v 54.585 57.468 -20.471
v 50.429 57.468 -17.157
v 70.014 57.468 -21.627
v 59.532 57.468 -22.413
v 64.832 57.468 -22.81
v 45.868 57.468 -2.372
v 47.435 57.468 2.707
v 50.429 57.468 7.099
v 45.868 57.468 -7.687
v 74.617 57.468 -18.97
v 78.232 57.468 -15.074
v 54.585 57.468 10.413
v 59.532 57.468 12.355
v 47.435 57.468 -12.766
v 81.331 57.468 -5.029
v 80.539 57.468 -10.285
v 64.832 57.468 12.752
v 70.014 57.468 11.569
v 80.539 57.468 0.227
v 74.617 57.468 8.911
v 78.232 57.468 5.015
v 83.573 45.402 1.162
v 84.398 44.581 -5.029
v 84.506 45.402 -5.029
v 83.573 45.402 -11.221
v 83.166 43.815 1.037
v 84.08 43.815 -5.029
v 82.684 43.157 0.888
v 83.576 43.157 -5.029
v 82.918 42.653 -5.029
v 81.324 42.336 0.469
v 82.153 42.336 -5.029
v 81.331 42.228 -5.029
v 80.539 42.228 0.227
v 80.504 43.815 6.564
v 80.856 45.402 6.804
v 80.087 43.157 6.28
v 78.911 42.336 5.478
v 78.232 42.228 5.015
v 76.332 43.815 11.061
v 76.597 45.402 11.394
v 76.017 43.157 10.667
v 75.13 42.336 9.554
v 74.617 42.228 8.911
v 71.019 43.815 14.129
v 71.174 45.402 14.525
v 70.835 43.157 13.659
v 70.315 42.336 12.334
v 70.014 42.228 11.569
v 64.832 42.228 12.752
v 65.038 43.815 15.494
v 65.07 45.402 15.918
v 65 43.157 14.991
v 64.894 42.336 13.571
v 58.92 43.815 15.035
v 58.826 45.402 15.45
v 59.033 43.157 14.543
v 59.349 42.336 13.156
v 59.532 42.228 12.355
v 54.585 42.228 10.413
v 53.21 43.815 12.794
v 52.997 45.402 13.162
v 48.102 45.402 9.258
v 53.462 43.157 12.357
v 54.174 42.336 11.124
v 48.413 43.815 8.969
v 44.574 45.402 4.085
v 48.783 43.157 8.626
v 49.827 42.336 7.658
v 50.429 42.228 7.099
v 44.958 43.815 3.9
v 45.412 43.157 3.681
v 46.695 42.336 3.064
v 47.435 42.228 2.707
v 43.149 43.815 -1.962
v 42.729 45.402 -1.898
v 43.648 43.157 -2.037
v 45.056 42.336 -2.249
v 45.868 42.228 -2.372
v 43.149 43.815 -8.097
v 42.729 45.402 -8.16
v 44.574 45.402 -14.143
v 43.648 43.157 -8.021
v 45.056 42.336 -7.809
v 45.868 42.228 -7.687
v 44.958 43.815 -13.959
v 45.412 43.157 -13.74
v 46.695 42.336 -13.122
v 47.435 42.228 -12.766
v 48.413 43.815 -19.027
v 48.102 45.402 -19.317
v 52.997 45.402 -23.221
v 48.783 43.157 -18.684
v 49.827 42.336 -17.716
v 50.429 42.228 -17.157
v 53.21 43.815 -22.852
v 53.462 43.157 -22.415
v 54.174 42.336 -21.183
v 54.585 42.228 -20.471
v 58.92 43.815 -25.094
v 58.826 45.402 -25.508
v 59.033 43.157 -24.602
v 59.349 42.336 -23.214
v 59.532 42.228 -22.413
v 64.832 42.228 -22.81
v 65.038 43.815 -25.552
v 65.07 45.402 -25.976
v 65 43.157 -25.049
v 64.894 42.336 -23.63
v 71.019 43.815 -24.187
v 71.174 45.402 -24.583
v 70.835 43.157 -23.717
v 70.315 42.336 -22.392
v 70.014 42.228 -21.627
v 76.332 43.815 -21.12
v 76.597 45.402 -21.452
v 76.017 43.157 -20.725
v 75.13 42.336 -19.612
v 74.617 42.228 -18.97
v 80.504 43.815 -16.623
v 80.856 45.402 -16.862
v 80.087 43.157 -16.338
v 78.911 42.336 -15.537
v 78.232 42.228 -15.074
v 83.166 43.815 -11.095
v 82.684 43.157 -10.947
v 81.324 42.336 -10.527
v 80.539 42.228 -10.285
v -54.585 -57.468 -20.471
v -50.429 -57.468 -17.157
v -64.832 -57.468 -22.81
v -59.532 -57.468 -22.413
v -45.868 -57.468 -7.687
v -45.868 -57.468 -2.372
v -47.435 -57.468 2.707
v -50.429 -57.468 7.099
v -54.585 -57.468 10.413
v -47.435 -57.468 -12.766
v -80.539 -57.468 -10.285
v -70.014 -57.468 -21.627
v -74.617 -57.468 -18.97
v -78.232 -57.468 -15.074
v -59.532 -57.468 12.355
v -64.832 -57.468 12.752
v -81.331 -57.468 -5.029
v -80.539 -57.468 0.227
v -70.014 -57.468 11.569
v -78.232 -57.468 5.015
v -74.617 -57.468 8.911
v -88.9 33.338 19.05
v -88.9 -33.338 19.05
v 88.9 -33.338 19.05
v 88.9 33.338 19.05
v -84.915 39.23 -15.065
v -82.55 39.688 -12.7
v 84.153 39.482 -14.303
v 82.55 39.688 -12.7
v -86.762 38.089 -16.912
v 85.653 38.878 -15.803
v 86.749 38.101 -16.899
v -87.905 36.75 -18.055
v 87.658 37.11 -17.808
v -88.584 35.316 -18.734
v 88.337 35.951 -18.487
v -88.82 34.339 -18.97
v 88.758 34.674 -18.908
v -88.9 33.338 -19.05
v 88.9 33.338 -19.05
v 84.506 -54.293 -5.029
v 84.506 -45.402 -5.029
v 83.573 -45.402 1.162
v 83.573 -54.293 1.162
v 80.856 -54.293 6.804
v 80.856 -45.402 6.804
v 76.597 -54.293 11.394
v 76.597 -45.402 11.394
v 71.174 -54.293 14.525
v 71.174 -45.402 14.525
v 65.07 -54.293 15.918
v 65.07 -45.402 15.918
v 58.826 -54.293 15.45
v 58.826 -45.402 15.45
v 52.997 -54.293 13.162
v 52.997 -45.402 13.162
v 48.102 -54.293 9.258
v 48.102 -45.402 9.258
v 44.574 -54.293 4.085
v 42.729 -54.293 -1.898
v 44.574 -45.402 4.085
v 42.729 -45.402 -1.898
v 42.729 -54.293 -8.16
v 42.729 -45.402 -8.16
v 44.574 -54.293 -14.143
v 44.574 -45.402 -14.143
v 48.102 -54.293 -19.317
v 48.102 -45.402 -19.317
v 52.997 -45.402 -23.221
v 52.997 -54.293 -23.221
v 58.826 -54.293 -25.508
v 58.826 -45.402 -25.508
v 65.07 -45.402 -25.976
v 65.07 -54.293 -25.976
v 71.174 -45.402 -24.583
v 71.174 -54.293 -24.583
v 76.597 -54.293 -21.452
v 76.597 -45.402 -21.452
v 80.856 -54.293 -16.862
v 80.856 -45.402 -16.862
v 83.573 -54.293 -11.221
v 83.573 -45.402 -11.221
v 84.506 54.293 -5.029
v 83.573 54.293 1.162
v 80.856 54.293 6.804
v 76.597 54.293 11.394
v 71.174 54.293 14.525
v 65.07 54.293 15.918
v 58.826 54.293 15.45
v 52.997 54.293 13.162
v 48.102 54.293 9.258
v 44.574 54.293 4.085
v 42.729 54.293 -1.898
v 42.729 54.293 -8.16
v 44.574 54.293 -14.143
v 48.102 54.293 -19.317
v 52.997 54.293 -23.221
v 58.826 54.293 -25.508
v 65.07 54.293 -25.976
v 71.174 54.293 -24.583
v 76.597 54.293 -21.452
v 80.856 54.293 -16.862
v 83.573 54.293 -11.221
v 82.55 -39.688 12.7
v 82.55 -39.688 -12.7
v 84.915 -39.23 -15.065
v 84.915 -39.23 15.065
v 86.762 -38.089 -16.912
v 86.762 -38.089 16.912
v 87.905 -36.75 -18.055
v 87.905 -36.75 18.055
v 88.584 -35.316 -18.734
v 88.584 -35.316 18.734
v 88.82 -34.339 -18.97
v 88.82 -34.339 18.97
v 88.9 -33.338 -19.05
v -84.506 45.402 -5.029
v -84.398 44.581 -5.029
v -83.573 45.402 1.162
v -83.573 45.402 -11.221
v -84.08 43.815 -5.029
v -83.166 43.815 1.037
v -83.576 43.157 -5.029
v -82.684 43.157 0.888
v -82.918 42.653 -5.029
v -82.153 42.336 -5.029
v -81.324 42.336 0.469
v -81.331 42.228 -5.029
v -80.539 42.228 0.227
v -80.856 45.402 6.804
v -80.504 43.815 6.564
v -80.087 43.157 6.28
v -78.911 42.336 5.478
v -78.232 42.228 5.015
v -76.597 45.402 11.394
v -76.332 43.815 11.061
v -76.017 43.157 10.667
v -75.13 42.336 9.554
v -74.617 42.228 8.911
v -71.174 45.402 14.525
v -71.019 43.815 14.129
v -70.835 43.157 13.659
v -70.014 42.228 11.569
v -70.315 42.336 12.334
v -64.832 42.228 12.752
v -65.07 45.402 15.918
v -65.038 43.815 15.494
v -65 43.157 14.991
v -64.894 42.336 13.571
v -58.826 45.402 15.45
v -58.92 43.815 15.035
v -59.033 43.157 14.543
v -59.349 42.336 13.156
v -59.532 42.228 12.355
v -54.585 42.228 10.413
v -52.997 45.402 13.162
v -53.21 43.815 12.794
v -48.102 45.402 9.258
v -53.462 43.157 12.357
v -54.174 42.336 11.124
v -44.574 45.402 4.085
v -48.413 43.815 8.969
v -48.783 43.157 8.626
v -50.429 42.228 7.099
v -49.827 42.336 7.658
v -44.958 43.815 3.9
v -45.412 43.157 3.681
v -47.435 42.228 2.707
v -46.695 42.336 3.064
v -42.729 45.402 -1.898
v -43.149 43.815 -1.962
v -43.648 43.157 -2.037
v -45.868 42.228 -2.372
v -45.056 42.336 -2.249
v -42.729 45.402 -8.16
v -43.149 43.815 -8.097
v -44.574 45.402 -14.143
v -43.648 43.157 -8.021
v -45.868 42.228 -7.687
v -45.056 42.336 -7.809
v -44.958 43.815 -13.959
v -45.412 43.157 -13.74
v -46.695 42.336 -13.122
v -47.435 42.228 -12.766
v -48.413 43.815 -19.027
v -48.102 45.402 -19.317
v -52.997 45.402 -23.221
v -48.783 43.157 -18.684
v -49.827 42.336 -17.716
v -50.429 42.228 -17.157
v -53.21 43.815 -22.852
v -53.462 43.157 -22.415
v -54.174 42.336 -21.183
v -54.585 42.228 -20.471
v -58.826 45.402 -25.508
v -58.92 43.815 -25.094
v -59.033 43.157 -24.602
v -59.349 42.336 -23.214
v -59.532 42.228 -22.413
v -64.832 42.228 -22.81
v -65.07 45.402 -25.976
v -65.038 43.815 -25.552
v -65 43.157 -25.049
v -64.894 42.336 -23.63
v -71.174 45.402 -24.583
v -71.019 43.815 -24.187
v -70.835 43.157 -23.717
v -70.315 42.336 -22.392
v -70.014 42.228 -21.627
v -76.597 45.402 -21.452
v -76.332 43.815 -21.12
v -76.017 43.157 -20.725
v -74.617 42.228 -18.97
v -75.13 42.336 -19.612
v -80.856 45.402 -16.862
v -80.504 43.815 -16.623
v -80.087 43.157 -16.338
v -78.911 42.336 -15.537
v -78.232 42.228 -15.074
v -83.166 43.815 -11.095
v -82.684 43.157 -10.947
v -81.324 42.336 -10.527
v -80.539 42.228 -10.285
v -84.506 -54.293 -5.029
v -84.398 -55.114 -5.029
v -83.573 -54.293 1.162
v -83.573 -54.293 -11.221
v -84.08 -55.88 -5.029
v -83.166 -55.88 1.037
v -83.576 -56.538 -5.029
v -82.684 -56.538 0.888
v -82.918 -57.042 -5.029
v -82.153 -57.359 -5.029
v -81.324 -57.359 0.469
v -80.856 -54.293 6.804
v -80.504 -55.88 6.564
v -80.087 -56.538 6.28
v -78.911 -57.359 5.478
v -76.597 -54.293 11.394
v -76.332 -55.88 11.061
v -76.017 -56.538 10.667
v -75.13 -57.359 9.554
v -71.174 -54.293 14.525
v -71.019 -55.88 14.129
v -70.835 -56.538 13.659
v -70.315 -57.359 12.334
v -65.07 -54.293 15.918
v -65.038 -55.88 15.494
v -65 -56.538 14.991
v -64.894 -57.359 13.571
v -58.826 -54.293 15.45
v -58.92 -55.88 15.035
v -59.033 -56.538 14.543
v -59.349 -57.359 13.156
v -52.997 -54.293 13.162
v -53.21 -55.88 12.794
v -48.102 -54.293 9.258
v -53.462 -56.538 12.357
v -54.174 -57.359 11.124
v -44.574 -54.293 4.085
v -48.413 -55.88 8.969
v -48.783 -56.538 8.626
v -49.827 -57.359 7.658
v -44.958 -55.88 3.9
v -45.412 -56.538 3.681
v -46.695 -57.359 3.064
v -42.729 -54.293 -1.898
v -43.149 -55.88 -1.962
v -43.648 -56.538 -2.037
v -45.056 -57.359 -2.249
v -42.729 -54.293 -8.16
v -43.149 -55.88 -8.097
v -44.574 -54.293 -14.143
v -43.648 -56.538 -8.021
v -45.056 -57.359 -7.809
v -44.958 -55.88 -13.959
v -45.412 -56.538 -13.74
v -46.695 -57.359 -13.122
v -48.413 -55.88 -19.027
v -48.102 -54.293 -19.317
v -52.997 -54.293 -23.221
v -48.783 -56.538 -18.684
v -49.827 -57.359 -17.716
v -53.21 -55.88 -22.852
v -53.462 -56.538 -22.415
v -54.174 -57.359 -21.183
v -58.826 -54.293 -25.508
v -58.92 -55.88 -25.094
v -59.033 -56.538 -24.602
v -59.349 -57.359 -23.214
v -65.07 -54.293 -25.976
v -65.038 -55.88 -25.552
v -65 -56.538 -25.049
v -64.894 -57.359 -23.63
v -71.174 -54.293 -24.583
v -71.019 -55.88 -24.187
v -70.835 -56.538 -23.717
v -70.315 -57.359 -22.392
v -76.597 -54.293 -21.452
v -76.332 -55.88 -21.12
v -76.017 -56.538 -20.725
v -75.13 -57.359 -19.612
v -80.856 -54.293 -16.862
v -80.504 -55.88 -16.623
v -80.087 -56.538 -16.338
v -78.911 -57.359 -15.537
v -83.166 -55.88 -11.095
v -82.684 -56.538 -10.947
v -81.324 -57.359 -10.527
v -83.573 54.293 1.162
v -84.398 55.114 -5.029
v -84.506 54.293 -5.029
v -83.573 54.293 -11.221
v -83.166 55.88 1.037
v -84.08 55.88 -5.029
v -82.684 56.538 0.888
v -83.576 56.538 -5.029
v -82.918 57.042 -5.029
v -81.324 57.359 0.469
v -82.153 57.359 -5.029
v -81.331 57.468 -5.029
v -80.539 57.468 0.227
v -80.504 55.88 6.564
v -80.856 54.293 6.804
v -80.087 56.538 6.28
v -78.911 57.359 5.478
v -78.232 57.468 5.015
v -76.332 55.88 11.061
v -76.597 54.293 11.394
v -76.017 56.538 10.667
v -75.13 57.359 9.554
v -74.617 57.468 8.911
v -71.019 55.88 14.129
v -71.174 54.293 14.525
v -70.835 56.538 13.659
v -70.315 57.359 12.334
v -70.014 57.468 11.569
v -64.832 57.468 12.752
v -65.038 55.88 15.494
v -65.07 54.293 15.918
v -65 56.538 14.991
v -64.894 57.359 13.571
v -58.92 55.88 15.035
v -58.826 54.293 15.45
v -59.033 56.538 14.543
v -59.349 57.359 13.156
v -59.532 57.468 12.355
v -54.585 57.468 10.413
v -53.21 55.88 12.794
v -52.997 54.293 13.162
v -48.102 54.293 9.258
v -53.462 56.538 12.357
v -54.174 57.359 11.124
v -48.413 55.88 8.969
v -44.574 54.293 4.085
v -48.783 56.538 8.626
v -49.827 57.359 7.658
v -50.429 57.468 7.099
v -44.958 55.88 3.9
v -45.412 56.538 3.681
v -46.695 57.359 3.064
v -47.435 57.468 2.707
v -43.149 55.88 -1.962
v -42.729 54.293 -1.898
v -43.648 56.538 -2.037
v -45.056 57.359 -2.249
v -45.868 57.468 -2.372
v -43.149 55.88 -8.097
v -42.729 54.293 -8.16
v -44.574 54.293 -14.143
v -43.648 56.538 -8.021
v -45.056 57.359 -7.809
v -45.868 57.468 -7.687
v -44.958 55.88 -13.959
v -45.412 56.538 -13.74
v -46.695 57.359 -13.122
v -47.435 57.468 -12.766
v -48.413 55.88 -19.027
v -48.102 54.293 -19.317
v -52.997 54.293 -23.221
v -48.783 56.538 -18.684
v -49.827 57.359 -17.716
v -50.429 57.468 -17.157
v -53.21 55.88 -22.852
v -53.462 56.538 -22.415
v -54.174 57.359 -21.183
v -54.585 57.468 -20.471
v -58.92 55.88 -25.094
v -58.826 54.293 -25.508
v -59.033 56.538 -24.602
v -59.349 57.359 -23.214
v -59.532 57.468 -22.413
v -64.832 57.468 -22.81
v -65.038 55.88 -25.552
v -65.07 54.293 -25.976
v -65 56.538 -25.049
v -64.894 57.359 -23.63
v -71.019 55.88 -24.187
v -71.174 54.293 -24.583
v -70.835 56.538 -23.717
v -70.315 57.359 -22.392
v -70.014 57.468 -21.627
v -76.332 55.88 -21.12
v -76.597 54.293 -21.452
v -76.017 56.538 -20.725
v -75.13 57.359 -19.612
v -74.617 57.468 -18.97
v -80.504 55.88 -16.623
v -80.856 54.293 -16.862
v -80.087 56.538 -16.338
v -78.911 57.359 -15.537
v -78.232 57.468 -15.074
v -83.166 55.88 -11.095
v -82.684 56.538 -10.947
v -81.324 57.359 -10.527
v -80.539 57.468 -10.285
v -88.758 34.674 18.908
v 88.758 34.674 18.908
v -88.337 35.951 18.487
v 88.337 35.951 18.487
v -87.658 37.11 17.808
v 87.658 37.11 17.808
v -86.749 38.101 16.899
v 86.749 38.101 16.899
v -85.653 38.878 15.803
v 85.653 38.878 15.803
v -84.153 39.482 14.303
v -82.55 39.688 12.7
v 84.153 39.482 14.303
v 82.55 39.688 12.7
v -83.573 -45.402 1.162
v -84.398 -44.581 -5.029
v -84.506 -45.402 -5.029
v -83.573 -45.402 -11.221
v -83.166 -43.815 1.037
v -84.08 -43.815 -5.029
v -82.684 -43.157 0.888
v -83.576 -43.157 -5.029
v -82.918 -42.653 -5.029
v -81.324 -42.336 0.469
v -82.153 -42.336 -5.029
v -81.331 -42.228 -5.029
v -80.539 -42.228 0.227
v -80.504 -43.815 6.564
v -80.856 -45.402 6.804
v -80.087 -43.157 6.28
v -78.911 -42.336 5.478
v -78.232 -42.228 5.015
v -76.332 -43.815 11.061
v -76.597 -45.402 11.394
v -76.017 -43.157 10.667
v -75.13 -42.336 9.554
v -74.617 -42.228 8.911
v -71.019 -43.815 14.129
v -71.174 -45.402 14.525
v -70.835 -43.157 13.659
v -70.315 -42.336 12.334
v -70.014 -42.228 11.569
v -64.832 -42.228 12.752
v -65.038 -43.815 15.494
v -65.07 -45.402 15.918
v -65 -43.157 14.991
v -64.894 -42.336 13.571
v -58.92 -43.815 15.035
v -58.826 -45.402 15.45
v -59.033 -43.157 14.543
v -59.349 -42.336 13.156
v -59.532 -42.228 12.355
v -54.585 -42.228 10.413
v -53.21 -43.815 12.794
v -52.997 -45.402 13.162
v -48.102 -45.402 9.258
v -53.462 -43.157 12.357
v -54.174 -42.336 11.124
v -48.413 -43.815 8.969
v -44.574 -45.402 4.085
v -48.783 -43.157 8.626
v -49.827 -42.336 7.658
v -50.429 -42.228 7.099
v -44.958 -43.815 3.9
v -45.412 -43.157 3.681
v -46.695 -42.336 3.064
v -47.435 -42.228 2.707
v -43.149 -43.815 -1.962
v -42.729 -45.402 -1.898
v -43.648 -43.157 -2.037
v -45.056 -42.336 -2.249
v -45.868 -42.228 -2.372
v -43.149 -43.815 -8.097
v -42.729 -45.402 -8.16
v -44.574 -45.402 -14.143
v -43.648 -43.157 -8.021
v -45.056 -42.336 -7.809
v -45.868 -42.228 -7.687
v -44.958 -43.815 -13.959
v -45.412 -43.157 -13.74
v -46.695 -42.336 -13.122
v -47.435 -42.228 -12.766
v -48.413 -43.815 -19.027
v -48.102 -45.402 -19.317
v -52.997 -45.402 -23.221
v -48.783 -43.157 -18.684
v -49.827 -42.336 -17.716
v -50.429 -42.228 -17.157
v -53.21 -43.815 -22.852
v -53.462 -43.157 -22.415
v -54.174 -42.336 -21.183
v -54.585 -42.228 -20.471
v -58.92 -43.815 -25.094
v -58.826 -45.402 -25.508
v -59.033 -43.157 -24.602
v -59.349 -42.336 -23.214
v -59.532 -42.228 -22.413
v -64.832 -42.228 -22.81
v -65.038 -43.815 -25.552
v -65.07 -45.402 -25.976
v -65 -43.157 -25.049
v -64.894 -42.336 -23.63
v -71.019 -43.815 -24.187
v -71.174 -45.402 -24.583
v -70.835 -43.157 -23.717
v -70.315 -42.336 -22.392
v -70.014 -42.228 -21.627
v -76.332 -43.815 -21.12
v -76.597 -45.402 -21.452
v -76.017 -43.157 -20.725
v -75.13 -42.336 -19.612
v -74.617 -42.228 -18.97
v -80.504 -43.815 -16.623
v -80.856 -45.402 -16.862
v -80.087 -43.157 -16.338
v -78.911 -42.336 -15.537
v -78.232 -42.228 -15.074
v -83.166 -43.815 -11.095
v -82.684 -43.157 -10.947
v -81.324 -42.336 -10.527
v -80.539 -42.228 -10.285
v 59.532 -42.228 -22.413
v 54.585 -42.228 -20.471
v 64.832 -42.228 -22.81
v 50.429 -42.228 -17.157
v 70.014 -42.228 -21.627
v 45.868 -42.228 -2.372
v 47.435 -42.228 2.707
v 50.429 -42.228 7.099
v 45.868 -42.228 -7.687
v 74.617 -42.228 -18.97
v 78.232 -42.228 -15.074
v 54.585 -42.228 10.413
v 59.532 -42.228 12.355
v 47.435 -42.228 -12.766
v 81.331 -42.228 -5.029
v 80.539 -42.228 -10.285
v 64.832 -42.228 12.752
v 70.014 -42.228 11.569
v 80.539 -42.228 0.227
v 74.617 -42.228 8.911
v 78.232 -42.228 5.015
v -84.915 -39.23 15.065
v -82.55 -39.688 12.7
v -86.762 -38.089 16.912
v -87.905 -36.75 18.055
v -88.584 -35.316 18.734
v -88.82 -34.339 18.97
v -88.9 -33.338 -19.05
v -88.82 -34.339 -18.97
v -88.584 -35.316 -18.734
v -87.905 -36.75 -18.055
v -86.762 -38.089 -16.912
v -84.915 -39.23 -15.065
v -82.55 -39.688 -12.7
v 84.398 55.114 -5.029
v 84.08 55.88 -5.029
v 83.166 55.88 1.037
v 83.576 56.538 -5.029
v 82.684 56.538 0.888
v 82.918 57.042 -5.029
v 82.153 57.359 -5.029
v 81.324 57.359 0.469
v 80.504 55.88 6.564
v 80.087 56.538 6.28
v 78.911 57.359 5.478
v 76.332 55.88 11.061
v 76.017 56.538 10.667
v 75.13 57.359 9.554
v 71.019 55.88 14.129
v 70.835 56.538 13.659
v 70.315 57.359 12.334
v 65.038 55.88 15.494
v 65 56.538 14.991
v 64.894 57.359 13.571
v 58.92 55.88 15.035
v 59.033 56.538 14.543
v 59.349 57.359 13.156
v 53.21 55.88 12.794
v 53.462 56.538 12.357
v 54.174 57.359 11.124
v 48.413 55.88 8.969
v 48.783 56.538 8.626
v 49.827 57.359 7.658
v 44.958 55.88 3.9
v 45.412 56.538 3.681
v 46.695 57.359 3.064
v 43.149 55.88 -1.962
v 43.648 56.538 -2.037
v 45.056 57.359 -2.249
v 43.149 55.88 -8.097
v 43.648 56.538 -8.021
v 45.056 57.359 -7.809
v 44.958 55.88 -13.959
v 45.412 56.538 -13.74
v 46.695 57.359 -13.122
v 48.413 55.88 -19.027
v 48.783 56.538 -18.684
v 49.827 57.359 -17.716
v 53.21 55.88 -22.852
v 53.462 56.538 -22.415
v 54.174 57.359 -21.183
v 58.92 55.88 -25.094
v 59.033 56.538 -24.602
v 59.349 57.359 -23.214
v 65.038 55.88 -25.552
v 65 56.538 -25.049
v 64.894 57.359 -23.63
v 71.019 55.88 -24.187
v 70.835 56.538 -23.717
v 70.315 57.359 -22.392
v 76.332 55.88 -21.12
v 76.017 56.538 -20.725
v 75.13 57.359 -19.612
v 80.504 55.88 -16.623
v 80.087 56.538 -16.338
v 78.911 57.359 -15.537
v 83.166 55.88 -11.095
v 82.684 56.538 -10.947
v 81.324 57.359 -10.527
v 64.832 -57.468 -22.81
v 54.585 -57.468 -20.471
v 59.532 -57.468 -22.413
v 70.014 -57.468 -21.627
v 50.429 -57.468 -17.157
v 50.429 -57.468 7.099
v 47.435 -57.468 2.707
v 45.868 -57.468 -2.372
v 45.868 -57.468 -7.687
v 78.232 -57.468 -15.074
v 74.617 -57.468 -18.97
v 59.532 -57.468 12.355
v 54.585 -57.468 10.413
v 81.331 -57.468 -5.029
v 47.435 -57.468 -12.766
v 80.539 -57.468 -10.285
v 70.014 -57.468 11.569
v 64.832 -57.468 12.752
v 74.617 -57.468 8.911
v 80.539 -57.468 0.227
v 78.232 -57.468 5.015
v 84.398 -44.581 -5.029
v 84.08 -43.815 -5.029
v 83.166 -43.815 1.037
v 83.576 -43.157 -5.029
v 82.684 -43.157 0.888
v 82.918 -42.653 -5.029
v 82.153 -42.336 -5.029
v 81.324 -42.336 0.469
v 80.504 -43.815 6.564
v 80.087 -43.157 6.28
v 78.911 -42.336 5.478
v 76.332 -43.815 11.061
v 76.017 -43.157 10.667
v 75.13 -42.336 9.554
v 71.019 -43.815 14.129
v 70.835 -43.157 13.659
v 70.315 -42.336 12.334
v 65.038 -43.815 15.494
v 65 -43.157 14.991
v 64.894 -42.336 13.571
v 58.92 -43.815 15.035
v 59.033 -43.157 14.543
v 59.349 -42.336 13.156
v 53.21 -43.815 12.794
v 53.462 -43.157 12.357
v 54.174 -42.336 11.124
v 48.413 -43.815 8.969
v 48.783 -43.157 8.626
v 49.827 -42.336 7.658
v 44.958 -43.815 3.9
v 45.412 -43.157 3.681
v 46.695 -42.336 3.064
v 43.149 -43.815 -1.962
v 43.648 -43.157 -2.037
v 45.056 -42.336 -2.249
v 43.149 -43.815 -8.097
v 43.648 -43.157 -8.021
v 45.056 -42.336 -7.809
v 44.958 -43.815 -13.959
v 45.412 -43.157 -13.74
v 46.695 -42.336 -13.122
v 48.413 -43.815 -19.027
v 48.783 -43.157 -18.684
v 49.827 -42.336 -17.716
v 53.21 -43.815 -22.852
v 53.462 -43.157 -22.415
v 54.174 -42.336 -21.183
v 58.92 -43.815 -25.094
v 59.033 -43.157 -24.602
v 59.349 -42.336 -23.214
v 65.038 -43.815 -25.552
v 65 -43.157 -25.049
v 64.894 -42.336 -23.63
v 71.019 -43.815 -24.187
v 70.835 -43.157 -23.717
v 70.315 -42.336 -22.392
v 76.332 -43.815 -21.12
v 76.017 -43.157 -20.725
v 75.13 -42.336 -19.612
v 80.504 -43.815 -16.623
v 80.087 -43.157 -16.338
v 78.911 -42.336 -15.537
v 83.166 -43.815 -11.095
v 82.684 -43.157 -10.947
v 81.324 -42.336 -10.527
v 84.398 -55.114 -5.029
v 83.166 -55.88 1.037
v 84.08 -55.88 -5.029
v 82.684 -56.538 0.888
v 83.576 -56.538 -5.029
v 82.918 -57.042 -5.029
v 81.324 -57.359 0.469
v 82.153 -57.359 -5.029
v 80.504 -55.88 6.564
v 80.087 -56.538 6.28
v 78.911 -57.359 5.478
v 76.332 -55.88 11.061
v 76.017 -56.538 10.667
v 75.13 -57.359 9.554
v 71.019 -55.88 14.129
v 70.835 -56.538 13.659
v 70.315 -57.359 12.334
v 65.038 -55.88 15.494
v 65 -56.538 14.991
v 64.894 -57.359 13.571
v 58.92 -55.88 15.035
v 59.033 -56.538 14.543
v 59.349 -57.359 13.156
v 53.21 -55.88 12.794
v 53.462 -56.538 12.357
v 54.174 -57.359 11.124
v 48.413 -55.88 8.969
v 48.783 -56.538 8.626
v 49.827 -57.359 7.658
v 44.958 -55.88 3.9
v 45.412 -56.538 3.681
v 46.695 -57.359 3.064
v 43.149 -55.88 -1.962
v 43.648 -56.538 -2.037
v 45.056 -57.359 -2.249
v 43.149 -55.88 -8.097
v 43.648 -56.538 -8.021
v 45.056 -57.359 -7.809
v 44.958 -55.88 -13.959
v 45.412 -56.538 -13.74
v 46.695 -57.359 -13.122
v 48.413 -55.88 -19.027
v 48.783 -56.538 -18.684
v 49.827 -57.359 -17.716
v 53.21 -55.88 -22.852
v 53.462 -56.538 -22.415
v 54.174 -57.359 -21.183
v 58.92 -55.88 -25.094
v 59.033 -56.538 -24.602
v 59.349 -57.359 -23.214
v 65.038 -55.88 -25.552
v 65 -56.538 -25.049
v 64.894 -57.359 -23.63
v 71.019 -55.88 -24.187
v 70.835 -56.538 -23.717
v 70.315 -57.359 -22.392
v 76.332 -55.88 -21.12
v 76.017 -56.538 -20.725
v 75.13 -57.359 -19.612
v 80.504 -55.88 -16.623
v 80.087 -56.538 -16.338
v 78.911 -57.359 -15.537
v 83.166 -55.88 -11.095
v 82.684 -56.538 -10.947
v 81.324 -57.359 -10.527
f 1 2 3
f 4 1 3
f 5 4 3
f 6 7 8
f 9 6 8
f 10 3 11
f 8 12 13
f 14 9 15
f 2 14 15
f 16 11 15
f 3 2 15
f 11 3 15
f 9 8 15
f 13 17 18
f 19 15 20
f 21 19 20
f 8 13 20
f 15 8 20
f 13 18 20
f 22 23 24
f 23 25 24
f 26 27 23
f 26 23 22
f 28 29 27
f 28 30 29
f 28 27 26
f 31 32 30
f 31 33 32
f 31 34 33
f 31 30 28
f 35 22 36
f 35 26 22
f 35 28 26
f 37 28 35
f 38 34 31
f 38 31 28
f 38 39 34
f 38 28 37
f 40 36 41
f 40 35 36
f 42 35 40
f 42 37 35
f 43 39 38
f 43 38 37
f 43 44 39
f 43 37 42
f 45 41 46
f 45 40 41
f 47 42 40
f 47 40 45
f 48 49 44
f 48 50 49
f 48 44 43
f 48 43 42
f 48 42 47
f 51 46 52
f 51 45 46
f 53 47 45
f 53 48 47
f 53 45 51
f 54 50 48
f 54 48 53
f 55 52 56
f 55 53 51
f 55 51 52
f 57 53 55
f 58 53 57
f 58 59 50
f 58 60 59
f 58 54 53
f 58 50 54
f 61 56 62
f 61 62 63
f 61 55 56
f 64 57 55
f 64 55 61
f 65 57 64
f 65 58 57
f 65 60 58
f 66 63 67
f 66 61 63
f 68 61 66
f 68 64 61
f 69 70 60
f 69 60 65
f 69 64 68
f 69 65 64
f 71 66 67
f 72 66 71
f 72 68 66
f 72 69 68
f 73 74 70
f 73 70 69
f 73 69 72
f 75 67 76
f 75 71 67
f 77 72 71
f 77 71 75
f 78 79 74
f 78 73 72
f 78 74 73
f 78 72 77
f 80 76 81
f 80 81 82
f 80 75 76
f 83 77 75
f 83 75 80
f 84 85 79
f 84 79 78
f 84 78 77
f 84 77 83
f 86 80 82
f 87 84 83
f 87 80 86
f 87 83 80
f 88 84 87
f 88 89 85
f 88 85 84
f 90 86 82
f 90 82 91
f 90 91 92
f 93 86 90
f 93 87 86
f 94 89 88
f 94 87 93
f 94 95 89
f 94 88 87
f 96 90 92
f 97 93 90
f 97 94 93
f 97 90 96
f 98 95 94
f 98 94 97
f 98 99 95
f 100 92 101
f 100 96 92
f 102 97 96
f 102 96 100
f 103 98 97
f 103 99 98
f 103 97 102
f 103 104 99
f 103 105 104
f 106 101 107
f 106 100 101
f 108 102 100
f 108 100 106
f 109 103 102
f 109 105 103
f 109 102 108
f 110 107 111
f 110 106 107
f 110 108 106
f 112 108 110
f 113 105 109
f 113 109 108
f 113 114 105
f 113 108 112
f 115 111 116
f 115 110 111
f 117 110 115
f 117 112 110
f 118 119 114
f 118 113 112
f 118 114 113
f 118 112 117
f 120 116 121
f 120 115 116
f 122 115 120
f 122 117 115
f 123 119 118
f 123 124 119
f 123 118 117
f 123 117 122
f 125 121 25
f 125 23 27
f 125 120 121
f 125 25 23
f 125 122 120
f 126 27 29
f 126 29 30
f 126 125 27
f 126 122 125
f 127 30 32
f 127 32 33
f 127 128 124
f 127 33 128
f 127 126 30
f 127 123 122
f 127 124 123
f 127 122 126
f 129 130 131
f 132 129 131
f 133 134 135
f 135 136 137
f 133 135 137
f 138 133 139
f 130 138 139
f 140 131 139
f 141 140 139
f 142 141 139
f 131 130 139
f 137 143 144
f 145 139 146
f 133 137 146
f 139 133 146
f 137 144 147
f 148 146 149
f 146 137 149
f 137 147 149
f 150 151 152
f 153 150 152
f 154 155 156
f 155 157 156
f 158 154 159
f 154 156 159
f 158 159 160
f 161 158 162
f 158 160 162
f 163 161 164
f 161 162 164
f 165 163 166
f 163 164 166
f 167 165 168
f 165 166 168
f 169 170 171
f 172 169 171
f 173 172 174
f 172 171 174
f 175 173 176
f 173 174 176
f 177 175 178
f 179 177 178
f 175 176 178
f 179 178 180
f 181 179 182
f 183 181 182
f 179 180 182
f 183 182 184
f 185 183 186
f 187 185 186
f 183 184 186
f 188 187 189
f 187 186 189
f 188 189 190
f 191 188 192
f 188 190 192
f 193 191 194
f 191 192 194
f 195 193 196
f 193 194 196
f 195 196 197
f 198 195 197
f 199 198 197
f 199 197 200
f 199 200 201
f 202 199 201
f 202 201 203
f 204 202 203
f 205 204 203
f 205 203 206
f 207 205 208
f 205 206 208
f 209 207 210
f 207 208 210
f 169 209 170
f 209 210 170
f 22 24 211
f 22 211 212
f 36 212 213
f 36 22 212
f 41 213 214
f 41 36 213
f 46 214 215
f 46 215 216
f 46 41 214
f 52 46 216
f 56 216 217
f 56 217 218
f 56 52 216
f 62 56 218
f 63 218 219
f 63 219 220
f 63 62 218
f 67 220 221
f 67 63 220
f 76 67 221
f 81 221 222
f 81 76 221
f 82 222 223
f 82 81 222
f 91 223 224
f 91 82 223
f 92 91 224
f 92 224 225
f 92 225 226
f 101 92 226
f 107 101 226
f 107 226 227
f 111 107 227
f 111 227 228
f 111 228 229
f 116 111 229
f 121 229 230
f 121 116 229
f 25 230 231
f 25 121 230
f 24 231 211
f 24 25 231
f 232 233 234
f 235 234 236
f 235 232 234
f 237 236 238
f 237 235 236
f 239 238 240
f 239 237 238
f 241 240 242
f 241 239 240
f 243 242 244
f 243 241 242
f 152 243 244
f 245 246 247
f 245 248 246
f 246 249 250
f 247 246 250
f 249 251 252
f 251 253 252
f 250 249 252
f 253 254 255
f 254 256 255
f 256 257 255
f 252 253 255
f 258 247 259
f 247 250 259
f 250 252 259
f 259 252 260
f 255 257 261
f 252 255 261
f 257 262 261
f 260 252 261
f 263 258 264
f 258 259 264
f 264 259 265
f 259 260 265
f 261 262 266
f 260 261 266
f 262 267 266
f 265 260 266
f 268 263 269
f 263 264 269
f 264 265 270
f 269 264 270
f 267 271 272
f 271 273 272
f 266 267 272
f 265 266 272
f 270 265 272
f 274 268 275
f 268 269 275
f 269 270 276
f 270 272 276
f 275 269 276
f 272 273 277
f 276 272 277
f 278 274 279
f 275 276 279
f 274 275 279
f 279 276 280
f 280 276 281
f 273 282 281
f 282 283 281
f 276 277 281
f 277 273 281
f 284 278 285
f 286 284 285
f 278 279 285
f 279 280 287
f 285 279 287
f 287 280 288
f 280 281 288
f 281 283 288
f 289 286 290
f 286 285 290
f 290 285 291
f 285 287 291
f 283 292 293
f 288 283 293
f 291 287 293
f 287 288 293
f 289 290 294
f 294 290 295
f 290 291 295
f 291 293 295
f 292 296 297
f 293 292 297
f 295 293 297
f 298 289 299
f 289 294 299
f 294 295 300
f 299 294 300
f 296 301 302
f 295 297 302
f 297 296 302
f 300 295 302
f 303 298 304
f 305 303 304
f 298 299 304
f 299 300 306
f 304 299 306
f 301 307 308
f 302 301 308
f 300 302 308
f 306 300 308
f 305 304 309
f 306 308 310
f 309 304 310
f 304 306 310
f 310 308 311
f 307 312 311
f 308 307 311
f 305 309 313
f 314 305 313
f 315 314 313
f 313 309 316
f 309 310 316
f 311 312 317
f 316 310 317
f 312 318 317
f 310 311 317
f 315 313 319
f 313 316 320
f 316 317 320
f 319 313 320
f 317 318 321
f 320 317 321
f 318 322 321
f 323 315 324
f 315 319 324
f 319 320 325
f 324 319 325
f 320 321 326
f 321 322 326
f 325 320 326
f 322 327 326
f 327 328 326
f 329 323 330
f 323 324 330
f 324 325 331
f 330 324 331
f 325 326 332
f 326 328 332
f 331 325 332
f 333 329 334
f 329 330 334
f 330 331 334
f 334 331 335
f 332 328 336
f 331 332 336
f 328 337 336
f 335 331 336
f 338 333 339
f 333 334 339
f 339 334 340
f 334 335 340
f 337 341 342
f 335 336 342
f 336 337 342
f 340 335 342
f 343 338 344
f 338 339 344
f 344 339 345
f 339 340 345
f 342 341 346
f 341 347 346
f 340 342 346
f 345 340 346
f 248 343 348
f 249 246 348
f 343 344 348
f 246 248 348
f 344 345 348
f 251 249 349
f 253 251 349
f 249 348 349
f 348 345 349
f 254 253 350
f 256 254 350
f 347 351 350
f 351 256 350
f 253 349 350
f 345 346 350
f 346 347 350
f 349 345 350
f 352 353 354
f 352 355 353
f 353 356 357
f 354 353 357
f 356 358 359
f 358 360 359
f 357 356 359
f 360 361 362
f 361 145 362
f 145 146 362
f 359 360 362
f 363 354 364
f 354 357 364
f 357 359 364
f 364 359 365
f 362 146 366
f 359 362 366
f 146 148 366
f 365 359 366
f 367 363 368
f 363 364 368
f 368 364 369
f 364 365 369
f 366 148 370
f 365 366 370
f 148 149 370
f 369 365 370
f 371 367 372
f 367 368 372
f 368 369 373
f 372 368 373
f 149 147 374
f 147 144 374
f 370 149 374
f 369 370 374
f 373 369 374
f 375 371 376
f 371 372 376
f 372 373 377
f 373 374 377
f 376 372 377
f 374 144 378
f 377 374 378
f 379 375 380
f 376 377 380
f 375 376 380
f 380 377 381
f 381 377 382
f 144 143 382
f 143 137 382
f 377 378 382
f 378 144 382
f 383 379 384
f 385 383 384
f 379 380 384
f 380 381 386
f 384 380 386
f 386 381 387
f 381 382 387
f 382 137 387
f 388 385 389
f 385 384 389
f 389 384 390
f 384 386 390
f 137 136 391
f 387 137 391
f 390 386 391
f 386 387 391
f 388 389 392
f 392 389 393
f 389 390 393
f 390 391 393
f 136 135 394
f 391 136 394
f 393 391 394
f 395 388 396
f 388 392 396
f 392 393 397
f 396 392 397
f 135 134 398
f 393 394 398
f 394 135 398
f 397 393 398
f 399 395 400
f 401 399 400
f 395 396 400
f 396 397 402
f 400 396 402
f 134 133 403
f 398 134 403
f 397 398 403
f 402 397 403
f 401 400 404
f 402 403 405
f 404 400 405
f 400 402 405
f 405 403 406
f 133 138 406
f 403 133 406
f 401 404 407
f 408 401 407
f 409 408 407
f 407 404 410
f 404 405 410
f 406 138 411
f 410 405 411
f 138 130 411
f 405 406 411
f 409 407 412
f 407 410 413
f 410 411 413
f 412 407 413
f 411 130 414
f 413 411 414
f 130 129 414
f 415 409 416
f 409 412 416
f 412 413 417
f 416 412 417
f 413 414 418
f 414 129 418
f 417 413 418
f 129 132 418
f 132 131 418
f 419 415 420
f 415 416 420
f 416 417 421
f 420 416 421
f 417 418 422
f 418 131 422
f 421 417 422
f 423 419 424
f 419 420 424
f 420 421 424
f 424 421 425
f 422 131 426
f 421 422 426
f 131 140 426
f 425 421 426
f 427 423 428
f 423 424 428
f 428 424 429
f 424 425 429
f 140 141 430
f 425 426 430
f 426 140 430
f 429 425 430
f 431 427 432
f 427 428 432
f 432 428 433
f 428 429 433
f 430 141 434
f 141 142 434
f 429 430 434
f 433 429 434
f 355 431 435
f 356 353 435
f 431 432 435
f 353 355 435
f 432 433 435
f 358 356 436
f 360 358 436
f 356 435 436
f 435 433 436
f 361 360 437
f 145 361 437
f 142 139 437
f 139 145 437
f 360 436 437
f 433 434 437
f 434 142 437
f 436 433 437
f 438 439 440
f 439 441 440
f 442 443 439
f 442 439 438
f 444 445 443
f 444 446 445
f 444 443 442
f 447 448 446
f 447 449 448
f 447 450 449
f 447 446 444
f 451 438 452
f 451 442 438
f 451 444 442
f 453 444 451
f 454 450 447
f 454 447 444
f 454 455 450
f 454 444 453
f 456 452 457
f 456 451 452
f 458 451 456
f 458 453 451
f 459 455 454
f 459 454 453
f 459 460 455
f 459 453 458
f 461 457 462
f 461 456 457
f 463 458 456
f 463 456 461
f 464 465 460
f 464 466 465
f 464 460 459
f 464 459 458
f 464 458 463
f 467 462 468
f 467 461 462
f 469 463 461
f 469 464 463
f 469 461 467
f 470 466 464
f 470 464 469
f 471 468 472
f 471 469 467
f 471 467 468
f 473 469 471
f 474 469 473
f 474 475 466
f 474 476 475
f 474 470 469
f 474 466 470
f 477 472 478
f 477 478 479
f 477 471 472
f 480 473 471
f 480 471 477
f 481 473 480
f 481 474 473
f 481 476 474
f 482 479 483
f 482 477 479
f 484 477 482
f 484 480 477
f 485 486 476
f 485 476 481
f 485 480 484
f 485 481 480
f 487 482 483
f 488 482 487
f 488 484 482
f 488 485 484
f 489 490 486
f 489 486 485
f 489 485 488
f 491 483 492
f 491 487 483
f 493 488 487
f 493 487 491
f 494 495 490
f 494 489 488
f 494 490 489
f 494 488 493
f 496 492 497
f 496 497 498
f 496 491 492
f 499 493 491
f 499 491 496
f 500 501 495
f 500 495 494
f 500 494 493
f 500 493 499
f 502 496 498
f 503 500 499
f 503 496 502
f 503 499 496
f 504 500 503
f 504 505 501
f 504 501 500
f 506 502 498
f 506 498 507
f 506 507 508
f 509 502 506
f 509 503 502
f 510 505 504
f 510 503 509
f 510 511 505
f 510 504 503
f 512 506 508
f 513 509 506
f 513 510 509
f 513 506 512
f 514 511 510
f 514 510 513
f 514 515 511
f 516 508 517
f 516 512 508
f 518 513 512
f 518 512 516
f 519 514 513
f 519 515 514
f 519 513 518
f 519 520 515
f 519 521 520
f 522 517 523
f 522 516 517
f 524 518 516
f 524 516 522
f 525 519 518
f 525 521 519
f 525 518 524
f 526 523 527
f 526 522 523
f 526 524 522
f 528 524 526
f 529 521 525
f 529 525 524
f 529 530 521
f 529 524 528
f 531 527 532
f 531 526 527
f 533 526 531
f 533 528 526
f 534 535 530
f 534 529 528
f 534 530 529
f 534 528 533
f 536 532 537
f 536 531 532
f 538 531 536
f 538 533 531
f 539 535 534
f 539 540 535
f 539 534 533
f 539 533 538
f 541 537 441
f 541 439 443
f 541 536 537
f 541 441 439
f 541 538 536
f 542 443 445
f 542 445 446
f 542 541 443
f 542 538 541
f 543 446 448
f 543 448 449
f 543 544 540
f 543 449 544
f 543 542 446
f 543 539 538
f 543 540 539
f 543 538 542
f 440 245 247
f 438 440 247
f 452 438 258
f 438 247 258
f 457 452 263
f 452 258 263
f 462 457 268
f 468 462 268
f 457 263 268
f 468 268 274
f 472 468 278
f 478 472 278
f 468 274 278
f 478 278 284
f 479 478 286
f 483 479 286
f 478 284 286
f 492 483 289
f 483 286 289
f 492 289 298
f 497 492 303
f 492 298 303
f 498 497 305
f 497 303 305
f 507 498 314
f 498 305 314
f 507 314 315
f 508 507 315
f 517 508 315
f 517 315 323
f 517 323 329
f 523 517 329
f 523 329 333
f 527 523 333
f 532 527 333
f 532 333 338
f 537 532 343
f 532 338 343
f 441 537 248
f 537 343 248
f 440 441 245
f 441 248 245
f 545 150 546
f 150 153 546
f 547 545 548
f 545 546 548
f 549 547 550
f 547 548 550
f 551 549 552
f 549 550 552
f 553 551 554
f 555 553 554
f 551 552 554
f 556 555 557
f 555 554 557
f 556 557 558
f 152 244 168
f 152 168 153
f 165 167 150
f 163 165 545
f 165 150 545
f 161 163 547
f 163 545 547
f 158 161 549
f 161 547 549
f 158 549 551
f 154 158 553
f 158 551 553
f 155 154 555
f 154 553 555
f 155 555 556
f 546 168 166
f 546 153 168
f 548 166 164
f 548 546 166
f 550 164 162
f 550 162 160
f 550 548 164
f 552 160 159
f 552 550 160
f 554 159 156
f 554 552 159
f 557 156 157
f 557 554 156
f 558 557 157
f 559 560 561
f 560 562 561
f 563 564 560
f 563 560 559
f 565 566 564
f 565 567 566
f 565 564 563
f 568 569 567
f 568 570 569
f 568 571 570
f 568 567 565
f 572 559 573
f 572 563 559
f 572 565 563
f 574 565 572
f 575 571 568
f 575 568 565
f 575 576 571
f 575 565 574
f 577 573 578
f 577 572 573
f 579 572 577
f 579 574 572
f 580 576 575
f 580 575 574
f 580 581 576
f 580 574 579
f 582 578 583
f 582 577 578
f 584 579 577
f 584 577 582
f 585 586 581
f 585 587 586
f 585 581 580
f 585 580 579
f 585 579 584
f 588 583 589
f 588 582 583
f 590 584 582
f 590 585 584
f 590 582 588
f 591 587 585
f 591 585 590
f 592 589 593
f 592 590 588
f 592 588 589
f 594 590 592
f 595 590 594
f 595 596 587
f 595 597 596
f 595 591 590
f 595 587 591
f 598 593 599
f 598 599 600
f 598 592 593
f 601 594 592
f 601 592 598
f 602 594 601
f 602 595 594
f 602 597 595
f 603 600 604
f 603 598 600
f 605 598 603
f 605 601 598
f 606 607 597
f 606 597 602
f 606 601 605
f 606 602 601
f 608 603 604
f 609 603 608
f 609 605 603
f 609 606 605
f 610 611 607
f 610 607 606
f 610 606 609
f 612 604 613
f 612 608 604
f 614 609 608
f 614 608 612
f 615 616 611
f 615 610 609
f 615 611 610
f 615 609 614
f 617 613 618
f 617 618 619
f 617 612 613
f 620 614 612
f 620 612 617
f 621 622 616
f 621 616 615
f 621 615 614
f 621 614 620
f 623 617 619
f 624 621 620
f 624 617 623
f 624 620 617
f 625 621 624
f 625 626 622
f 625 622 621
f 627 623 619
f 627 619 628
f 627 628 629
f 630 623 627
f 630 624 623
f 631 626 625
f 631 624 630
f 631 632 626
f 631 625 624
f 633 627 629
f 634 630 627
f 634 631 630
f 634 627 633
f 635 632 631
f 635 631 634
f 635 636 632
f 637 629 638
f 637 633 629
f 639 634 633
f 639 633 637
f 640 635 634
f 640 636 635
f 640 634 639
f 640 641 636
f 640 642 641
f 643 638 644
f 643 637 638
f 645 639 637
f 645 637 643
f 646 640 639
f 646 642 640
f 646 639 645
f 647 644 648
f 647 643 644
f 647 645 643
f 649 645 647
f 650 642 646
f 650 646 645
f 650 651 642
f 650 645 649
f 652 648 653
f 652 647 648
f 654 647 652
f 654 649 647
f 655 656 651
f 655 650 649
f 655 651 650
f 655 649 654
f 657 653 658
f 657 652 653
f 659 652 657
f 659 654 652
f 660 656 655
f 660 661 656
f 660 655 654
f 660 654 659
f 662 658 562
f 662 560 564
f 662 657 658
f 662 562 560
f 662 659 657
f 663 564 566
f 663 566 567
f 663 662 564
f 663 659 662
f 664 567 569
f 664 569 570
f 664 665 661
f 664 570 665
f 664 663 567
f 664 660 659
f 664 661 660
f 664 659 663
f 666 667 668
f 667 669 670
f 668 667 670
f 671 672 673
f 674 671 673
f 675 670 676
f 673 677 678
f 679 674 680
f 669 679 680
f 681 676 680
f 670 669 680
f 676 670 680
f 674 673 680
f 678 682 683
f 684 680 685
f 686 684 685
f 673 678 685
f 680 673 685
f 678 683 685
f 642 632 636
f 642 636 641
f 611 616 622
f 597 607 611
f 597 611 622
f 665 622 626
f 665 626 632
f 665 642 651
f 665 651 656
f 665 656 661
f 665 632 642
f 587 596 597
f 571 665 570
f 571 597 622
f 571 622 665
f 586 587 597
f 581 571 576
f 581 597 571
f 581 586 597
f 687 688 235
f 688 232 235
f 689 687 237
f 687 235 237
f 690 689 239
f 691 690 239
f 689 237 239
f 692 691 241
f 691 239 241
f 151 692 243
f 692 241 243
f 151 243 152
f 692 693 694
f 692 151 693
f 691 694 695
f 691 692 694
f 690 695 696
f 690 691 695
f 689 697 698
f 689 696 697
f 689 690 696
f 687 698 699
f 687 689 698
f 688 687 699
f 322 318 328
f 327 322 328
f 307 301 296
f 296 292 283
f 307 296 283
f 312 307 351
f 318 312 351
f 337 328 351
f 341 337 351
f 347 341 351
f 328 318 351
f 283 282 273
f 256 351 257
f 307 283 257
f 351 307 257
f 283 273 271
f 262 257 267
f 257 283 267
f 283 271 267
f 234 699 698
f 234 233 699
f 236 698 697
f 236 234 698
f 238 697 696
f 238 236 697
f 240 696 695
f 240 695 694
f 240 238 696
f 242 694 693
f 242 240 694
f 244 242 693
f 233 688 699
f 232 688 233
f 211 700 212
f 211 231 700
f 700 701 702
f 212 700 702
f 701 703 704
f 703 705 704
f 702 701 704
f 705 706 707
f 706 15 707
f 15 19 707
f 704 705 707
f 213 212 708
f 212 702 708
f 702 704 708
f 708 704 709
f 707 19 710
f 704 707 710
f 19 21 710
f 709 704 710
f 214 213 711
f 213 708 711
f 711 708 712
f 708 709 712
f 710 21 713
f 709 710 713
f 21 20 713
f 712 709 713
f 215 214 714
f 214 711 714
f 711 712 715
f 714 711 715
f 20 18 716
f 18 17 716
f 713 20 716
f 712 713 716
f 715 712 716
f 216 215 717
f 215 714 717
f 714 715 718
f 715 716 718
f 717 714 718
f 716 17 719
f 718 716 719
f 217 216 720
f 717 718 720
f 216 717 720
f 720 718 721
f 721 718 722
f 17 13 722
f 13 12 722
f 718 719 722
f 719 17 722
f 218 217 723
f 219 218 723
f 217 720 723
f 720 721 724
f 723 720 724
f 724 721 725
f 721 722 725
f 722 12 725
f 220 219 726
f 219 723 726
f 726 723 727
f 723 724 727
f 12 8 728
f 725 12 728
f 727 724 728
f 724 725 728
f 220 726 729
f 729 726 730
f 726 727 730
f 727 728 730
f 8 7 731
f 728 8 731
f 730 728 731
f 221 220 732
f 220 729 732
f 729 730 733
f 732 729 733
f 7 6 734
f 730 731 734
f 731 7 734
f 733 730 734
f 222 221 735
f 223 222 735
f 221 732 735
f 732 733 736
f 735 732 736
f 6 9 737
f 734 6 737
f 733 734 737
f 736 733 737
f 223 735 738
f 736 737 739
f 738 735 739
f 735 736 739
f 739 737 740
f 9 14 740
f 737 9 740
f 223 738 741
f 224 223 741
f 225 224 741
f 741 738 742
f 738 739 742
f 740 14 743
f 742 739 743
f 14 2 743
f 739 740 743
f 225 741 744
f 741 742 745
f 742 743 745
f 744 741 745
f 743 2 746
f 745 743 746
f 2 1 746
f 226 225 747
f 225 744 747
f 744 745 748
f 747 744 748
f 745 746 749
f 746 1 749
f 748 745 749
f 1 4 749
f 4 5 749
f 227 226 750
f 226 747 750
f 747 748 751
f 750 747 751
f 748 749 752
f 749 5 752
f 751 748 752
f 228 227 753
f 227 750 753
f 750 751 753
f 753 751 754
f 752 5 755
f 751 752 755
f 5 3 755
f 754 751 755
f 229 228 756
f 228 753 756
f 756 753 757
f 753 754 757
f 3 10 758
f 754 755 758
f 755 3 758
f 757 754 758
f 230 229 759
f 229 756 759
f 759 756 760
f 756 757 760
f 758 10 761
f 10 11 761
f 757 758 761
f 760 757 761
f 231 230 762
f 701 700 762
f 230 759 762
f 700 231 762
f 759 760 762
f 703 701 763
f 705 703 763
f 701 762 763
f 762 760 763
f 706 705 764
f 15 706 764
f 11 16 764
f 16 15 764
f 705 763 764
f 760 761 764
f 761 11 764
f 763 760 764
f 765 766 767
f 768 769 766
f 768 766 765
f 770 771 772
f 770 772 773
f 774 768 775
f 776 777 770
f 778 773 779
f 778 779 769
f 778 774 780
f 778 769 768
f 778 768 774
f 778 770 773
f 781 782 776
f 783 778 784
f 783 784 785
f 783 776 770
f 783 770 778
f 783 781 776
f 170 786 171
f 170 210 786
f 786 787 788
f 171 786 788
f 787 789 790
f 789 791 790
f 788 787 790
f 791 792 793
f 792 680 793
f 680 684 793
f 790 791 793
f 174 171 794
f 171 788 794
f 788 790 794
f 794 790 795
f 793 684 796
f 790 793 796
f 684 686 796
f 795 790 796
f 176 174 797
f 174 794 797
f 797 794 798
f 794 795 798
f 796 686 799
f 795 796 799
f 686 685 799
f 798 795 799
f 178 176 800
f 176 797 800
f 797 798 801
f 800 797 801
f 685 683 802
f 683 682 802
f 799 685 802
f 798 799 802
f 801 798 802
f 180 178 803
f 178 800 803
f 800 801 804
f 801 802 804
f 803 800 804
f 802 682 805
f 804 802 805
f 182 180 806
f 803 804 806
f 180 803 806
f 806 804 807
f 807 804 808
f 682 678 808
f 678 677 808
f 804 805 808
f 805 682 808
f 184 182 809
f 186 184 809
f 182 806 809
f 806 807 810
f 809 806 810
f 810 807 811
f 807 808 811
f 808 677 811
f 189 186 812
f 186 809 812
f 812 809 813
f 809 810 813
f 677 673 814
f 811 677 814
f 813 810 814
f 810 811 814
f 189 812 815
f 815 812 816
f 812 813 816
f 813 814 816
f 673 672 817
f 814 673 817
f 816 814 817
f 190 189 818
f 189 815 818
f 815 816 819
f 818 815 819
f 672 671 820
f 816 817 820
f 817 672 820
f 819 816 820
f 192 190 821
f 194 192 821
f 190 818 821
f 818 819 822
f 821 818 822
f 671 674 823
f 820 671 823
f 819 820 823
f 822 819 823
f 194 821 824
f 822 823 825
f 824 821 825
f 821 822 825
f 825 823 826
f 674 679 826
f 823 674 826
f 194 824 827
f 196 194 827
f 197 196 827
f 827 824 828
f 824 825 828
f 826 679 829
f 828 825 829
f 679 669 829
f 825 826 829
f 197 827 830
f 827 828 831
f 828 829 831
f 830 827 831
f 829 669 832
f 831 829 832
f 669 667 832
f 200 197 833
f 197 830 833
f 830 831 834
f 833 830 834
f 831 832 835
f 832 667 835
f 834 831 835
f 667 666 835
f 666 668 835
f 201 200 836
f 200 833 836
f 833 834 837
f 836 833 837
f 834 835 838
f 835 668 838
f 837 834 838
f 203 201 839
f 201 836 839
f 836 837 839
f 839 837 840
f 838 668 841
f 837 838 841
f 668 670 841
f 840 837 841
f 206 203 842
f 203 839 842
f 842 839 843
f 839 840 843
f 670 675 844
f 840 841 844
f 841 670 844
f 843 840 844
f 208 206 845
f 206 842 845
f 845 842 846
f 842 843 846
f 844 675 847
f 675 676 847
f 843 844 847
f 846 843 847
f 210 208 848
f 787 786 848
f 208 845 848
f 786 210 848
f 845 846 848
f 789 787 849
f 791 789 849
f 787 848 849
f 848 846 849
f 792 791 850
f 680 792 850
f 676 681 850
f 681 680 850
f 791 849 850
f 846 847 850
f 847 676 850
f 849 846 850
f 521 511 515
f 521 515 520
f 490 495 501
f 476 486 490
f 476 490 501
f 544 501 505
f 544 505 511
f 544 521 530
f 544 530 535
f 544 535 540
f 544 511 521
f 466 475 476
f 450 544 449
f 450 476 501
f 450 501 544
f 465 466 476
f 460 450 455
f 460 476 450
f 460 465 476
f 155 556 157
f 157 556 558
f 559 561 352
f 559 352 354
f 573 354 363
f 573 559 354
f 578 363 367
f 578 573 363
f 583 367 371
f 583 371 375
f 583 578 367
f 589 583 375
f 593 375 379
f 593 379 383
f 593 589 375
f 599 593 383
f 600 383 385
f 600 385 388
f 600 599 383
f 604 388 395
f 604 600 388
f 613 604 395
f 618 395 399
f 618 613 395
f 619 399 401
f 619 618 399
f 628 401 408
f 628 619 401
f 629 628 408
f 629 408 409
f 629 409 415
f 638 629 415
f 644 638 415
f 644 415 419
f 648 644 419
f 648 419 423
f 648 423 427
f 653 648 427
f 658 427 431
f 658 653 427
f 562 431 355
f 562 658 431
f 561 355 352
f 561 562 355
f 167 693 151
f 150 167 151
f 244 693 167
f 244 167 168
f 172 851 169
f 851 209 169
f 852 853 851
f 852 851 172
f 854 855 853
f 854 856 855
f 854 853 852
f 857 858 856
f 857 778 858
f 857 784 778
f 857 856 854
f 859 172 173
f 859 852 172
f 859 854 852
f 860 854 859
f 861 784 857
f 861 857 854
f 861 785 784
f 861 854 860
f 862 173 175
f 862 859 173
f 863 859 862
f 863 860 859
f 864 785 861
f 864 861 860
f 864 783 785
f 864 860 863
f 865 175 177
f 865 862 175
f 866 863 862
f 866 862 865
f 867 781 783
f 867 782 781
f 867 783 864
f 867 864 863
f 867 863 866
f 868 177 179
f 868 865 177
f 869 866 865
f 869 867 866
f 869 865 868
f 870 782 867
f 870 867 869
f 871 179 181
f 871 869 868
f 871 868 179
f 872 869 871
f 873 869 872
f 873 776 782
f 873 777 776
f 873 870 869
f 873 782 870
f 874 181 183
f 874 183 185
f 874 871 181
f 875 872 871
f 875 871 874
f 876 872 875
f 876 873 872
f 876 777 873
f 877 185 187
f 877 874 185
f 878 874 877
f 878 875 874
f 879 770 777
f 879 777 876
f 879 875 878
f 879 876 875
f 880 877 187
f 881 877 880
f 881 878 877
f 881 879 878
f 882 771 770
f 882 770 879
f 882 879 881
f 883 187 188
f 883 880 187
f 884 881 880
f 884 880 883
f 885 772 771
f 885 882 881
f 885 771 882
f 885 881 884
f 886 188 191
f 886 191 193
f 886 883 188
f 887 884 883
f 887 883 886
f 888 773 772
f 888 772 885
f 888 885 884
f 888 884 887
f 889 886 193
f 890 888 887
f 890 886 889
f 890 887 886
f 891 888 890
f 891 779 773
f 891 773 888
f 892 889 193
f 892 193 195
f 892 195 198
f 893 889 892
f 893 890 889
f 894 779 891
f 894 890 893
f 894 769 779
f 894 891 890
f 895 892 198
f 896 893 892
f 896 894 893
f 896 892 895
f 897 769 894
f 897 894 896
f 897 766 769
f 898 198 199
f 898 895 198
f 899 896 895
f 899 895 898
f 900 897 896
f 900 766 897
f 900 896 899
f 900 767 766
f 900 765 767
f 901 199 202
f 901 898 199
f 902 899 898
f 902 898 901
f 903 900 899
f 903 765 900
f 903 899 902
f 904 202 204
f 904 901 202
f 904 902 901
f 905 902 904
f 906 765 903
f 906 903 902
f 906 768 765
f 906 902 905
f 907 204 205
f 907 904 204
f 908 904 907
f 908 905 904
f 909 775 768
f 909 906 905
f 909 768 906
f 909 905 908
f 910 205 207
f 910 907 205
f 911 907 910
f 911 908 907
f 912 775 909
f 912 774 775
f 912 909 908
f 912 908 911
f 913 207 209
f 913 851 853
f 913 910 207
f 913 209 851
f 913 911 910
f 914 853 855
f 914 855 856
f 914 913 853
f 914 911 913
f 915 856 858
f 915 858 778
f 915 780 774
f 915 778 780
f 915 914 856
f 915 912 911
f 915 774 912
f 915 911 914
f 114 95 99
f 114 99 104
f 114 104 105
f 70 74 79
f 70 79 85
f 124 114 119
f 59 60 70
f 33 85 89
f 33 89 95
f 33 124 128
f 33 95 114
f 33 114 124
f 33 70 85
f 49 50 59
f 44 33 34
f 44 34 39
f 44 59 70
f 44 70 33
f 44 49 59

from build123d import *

# Parameters (mm, degrees)
F1_W     = 177.8
F1_H     = 38.1
F2_DEPTH = 39.6875
F4_R     = 21.0058
F5_DEPTH = 15.24
F6_R     = 6.35
F7_R     = 3.175


with BuildPart() as f2:
    # F1 (on Front) → F2 (new body, symmetric)
    with BuildSketch(Plane.XZ):
        Rectangle(F1_W, F1_H)
    extrude(amount=F2_DEPTH, both=True)

    # F6
    f6_edges = [f2.edges().sort_by_distance(p)[0] for p in [
        (0, -39.6875, 19.05),
        (0, -39.6875, -19.05),
        (-88.9, -39.6875, 0),
        (88.9, -39.6875, 0),
        (0, 39.6875, 19.05),
        (88.9, 39.6875, 0),
        (0, 39.6875, -19.05),
        (-88.9, 39.6875, 0),
    ]]
    fillet(f6_edges, radius=F6_R)


with BuildPart() as f5:
    # F4 (on offset) → F5 (new body)
    with BuildSketch(Plane.XZ.offset(42.2275)):
        with Locations((63.5, -5.0292)):
            Circle(F4_R)
    extrude(amount=F5_DEPTH)

    # F7
    f7_edges = [f5.edges().sort_by_distance(p)[0] for p in [
        (42.4942, -57.4675, -5.0292),
        (42.4942, -42.2275, -5.0292),
    ]]
    fillet(f7_edges, radius=F7_R)


with BuildPart() as f8_1:
    # F8: instance of F5
    add(f5.part.mirror(Plane.XZ))


with BuildPart() as f9_1:
    # F9: instance of F5
    add(f5.part.mirror(Plane.YZ))


with BuildPart() as f9_2:
    # F9: instance of F8_1
    add(f8_1.part.mirror(Plane.YZ))


solid = Compound([f2.part, f5.part, f8_1.part, f9_1.part, f9_2.part])
